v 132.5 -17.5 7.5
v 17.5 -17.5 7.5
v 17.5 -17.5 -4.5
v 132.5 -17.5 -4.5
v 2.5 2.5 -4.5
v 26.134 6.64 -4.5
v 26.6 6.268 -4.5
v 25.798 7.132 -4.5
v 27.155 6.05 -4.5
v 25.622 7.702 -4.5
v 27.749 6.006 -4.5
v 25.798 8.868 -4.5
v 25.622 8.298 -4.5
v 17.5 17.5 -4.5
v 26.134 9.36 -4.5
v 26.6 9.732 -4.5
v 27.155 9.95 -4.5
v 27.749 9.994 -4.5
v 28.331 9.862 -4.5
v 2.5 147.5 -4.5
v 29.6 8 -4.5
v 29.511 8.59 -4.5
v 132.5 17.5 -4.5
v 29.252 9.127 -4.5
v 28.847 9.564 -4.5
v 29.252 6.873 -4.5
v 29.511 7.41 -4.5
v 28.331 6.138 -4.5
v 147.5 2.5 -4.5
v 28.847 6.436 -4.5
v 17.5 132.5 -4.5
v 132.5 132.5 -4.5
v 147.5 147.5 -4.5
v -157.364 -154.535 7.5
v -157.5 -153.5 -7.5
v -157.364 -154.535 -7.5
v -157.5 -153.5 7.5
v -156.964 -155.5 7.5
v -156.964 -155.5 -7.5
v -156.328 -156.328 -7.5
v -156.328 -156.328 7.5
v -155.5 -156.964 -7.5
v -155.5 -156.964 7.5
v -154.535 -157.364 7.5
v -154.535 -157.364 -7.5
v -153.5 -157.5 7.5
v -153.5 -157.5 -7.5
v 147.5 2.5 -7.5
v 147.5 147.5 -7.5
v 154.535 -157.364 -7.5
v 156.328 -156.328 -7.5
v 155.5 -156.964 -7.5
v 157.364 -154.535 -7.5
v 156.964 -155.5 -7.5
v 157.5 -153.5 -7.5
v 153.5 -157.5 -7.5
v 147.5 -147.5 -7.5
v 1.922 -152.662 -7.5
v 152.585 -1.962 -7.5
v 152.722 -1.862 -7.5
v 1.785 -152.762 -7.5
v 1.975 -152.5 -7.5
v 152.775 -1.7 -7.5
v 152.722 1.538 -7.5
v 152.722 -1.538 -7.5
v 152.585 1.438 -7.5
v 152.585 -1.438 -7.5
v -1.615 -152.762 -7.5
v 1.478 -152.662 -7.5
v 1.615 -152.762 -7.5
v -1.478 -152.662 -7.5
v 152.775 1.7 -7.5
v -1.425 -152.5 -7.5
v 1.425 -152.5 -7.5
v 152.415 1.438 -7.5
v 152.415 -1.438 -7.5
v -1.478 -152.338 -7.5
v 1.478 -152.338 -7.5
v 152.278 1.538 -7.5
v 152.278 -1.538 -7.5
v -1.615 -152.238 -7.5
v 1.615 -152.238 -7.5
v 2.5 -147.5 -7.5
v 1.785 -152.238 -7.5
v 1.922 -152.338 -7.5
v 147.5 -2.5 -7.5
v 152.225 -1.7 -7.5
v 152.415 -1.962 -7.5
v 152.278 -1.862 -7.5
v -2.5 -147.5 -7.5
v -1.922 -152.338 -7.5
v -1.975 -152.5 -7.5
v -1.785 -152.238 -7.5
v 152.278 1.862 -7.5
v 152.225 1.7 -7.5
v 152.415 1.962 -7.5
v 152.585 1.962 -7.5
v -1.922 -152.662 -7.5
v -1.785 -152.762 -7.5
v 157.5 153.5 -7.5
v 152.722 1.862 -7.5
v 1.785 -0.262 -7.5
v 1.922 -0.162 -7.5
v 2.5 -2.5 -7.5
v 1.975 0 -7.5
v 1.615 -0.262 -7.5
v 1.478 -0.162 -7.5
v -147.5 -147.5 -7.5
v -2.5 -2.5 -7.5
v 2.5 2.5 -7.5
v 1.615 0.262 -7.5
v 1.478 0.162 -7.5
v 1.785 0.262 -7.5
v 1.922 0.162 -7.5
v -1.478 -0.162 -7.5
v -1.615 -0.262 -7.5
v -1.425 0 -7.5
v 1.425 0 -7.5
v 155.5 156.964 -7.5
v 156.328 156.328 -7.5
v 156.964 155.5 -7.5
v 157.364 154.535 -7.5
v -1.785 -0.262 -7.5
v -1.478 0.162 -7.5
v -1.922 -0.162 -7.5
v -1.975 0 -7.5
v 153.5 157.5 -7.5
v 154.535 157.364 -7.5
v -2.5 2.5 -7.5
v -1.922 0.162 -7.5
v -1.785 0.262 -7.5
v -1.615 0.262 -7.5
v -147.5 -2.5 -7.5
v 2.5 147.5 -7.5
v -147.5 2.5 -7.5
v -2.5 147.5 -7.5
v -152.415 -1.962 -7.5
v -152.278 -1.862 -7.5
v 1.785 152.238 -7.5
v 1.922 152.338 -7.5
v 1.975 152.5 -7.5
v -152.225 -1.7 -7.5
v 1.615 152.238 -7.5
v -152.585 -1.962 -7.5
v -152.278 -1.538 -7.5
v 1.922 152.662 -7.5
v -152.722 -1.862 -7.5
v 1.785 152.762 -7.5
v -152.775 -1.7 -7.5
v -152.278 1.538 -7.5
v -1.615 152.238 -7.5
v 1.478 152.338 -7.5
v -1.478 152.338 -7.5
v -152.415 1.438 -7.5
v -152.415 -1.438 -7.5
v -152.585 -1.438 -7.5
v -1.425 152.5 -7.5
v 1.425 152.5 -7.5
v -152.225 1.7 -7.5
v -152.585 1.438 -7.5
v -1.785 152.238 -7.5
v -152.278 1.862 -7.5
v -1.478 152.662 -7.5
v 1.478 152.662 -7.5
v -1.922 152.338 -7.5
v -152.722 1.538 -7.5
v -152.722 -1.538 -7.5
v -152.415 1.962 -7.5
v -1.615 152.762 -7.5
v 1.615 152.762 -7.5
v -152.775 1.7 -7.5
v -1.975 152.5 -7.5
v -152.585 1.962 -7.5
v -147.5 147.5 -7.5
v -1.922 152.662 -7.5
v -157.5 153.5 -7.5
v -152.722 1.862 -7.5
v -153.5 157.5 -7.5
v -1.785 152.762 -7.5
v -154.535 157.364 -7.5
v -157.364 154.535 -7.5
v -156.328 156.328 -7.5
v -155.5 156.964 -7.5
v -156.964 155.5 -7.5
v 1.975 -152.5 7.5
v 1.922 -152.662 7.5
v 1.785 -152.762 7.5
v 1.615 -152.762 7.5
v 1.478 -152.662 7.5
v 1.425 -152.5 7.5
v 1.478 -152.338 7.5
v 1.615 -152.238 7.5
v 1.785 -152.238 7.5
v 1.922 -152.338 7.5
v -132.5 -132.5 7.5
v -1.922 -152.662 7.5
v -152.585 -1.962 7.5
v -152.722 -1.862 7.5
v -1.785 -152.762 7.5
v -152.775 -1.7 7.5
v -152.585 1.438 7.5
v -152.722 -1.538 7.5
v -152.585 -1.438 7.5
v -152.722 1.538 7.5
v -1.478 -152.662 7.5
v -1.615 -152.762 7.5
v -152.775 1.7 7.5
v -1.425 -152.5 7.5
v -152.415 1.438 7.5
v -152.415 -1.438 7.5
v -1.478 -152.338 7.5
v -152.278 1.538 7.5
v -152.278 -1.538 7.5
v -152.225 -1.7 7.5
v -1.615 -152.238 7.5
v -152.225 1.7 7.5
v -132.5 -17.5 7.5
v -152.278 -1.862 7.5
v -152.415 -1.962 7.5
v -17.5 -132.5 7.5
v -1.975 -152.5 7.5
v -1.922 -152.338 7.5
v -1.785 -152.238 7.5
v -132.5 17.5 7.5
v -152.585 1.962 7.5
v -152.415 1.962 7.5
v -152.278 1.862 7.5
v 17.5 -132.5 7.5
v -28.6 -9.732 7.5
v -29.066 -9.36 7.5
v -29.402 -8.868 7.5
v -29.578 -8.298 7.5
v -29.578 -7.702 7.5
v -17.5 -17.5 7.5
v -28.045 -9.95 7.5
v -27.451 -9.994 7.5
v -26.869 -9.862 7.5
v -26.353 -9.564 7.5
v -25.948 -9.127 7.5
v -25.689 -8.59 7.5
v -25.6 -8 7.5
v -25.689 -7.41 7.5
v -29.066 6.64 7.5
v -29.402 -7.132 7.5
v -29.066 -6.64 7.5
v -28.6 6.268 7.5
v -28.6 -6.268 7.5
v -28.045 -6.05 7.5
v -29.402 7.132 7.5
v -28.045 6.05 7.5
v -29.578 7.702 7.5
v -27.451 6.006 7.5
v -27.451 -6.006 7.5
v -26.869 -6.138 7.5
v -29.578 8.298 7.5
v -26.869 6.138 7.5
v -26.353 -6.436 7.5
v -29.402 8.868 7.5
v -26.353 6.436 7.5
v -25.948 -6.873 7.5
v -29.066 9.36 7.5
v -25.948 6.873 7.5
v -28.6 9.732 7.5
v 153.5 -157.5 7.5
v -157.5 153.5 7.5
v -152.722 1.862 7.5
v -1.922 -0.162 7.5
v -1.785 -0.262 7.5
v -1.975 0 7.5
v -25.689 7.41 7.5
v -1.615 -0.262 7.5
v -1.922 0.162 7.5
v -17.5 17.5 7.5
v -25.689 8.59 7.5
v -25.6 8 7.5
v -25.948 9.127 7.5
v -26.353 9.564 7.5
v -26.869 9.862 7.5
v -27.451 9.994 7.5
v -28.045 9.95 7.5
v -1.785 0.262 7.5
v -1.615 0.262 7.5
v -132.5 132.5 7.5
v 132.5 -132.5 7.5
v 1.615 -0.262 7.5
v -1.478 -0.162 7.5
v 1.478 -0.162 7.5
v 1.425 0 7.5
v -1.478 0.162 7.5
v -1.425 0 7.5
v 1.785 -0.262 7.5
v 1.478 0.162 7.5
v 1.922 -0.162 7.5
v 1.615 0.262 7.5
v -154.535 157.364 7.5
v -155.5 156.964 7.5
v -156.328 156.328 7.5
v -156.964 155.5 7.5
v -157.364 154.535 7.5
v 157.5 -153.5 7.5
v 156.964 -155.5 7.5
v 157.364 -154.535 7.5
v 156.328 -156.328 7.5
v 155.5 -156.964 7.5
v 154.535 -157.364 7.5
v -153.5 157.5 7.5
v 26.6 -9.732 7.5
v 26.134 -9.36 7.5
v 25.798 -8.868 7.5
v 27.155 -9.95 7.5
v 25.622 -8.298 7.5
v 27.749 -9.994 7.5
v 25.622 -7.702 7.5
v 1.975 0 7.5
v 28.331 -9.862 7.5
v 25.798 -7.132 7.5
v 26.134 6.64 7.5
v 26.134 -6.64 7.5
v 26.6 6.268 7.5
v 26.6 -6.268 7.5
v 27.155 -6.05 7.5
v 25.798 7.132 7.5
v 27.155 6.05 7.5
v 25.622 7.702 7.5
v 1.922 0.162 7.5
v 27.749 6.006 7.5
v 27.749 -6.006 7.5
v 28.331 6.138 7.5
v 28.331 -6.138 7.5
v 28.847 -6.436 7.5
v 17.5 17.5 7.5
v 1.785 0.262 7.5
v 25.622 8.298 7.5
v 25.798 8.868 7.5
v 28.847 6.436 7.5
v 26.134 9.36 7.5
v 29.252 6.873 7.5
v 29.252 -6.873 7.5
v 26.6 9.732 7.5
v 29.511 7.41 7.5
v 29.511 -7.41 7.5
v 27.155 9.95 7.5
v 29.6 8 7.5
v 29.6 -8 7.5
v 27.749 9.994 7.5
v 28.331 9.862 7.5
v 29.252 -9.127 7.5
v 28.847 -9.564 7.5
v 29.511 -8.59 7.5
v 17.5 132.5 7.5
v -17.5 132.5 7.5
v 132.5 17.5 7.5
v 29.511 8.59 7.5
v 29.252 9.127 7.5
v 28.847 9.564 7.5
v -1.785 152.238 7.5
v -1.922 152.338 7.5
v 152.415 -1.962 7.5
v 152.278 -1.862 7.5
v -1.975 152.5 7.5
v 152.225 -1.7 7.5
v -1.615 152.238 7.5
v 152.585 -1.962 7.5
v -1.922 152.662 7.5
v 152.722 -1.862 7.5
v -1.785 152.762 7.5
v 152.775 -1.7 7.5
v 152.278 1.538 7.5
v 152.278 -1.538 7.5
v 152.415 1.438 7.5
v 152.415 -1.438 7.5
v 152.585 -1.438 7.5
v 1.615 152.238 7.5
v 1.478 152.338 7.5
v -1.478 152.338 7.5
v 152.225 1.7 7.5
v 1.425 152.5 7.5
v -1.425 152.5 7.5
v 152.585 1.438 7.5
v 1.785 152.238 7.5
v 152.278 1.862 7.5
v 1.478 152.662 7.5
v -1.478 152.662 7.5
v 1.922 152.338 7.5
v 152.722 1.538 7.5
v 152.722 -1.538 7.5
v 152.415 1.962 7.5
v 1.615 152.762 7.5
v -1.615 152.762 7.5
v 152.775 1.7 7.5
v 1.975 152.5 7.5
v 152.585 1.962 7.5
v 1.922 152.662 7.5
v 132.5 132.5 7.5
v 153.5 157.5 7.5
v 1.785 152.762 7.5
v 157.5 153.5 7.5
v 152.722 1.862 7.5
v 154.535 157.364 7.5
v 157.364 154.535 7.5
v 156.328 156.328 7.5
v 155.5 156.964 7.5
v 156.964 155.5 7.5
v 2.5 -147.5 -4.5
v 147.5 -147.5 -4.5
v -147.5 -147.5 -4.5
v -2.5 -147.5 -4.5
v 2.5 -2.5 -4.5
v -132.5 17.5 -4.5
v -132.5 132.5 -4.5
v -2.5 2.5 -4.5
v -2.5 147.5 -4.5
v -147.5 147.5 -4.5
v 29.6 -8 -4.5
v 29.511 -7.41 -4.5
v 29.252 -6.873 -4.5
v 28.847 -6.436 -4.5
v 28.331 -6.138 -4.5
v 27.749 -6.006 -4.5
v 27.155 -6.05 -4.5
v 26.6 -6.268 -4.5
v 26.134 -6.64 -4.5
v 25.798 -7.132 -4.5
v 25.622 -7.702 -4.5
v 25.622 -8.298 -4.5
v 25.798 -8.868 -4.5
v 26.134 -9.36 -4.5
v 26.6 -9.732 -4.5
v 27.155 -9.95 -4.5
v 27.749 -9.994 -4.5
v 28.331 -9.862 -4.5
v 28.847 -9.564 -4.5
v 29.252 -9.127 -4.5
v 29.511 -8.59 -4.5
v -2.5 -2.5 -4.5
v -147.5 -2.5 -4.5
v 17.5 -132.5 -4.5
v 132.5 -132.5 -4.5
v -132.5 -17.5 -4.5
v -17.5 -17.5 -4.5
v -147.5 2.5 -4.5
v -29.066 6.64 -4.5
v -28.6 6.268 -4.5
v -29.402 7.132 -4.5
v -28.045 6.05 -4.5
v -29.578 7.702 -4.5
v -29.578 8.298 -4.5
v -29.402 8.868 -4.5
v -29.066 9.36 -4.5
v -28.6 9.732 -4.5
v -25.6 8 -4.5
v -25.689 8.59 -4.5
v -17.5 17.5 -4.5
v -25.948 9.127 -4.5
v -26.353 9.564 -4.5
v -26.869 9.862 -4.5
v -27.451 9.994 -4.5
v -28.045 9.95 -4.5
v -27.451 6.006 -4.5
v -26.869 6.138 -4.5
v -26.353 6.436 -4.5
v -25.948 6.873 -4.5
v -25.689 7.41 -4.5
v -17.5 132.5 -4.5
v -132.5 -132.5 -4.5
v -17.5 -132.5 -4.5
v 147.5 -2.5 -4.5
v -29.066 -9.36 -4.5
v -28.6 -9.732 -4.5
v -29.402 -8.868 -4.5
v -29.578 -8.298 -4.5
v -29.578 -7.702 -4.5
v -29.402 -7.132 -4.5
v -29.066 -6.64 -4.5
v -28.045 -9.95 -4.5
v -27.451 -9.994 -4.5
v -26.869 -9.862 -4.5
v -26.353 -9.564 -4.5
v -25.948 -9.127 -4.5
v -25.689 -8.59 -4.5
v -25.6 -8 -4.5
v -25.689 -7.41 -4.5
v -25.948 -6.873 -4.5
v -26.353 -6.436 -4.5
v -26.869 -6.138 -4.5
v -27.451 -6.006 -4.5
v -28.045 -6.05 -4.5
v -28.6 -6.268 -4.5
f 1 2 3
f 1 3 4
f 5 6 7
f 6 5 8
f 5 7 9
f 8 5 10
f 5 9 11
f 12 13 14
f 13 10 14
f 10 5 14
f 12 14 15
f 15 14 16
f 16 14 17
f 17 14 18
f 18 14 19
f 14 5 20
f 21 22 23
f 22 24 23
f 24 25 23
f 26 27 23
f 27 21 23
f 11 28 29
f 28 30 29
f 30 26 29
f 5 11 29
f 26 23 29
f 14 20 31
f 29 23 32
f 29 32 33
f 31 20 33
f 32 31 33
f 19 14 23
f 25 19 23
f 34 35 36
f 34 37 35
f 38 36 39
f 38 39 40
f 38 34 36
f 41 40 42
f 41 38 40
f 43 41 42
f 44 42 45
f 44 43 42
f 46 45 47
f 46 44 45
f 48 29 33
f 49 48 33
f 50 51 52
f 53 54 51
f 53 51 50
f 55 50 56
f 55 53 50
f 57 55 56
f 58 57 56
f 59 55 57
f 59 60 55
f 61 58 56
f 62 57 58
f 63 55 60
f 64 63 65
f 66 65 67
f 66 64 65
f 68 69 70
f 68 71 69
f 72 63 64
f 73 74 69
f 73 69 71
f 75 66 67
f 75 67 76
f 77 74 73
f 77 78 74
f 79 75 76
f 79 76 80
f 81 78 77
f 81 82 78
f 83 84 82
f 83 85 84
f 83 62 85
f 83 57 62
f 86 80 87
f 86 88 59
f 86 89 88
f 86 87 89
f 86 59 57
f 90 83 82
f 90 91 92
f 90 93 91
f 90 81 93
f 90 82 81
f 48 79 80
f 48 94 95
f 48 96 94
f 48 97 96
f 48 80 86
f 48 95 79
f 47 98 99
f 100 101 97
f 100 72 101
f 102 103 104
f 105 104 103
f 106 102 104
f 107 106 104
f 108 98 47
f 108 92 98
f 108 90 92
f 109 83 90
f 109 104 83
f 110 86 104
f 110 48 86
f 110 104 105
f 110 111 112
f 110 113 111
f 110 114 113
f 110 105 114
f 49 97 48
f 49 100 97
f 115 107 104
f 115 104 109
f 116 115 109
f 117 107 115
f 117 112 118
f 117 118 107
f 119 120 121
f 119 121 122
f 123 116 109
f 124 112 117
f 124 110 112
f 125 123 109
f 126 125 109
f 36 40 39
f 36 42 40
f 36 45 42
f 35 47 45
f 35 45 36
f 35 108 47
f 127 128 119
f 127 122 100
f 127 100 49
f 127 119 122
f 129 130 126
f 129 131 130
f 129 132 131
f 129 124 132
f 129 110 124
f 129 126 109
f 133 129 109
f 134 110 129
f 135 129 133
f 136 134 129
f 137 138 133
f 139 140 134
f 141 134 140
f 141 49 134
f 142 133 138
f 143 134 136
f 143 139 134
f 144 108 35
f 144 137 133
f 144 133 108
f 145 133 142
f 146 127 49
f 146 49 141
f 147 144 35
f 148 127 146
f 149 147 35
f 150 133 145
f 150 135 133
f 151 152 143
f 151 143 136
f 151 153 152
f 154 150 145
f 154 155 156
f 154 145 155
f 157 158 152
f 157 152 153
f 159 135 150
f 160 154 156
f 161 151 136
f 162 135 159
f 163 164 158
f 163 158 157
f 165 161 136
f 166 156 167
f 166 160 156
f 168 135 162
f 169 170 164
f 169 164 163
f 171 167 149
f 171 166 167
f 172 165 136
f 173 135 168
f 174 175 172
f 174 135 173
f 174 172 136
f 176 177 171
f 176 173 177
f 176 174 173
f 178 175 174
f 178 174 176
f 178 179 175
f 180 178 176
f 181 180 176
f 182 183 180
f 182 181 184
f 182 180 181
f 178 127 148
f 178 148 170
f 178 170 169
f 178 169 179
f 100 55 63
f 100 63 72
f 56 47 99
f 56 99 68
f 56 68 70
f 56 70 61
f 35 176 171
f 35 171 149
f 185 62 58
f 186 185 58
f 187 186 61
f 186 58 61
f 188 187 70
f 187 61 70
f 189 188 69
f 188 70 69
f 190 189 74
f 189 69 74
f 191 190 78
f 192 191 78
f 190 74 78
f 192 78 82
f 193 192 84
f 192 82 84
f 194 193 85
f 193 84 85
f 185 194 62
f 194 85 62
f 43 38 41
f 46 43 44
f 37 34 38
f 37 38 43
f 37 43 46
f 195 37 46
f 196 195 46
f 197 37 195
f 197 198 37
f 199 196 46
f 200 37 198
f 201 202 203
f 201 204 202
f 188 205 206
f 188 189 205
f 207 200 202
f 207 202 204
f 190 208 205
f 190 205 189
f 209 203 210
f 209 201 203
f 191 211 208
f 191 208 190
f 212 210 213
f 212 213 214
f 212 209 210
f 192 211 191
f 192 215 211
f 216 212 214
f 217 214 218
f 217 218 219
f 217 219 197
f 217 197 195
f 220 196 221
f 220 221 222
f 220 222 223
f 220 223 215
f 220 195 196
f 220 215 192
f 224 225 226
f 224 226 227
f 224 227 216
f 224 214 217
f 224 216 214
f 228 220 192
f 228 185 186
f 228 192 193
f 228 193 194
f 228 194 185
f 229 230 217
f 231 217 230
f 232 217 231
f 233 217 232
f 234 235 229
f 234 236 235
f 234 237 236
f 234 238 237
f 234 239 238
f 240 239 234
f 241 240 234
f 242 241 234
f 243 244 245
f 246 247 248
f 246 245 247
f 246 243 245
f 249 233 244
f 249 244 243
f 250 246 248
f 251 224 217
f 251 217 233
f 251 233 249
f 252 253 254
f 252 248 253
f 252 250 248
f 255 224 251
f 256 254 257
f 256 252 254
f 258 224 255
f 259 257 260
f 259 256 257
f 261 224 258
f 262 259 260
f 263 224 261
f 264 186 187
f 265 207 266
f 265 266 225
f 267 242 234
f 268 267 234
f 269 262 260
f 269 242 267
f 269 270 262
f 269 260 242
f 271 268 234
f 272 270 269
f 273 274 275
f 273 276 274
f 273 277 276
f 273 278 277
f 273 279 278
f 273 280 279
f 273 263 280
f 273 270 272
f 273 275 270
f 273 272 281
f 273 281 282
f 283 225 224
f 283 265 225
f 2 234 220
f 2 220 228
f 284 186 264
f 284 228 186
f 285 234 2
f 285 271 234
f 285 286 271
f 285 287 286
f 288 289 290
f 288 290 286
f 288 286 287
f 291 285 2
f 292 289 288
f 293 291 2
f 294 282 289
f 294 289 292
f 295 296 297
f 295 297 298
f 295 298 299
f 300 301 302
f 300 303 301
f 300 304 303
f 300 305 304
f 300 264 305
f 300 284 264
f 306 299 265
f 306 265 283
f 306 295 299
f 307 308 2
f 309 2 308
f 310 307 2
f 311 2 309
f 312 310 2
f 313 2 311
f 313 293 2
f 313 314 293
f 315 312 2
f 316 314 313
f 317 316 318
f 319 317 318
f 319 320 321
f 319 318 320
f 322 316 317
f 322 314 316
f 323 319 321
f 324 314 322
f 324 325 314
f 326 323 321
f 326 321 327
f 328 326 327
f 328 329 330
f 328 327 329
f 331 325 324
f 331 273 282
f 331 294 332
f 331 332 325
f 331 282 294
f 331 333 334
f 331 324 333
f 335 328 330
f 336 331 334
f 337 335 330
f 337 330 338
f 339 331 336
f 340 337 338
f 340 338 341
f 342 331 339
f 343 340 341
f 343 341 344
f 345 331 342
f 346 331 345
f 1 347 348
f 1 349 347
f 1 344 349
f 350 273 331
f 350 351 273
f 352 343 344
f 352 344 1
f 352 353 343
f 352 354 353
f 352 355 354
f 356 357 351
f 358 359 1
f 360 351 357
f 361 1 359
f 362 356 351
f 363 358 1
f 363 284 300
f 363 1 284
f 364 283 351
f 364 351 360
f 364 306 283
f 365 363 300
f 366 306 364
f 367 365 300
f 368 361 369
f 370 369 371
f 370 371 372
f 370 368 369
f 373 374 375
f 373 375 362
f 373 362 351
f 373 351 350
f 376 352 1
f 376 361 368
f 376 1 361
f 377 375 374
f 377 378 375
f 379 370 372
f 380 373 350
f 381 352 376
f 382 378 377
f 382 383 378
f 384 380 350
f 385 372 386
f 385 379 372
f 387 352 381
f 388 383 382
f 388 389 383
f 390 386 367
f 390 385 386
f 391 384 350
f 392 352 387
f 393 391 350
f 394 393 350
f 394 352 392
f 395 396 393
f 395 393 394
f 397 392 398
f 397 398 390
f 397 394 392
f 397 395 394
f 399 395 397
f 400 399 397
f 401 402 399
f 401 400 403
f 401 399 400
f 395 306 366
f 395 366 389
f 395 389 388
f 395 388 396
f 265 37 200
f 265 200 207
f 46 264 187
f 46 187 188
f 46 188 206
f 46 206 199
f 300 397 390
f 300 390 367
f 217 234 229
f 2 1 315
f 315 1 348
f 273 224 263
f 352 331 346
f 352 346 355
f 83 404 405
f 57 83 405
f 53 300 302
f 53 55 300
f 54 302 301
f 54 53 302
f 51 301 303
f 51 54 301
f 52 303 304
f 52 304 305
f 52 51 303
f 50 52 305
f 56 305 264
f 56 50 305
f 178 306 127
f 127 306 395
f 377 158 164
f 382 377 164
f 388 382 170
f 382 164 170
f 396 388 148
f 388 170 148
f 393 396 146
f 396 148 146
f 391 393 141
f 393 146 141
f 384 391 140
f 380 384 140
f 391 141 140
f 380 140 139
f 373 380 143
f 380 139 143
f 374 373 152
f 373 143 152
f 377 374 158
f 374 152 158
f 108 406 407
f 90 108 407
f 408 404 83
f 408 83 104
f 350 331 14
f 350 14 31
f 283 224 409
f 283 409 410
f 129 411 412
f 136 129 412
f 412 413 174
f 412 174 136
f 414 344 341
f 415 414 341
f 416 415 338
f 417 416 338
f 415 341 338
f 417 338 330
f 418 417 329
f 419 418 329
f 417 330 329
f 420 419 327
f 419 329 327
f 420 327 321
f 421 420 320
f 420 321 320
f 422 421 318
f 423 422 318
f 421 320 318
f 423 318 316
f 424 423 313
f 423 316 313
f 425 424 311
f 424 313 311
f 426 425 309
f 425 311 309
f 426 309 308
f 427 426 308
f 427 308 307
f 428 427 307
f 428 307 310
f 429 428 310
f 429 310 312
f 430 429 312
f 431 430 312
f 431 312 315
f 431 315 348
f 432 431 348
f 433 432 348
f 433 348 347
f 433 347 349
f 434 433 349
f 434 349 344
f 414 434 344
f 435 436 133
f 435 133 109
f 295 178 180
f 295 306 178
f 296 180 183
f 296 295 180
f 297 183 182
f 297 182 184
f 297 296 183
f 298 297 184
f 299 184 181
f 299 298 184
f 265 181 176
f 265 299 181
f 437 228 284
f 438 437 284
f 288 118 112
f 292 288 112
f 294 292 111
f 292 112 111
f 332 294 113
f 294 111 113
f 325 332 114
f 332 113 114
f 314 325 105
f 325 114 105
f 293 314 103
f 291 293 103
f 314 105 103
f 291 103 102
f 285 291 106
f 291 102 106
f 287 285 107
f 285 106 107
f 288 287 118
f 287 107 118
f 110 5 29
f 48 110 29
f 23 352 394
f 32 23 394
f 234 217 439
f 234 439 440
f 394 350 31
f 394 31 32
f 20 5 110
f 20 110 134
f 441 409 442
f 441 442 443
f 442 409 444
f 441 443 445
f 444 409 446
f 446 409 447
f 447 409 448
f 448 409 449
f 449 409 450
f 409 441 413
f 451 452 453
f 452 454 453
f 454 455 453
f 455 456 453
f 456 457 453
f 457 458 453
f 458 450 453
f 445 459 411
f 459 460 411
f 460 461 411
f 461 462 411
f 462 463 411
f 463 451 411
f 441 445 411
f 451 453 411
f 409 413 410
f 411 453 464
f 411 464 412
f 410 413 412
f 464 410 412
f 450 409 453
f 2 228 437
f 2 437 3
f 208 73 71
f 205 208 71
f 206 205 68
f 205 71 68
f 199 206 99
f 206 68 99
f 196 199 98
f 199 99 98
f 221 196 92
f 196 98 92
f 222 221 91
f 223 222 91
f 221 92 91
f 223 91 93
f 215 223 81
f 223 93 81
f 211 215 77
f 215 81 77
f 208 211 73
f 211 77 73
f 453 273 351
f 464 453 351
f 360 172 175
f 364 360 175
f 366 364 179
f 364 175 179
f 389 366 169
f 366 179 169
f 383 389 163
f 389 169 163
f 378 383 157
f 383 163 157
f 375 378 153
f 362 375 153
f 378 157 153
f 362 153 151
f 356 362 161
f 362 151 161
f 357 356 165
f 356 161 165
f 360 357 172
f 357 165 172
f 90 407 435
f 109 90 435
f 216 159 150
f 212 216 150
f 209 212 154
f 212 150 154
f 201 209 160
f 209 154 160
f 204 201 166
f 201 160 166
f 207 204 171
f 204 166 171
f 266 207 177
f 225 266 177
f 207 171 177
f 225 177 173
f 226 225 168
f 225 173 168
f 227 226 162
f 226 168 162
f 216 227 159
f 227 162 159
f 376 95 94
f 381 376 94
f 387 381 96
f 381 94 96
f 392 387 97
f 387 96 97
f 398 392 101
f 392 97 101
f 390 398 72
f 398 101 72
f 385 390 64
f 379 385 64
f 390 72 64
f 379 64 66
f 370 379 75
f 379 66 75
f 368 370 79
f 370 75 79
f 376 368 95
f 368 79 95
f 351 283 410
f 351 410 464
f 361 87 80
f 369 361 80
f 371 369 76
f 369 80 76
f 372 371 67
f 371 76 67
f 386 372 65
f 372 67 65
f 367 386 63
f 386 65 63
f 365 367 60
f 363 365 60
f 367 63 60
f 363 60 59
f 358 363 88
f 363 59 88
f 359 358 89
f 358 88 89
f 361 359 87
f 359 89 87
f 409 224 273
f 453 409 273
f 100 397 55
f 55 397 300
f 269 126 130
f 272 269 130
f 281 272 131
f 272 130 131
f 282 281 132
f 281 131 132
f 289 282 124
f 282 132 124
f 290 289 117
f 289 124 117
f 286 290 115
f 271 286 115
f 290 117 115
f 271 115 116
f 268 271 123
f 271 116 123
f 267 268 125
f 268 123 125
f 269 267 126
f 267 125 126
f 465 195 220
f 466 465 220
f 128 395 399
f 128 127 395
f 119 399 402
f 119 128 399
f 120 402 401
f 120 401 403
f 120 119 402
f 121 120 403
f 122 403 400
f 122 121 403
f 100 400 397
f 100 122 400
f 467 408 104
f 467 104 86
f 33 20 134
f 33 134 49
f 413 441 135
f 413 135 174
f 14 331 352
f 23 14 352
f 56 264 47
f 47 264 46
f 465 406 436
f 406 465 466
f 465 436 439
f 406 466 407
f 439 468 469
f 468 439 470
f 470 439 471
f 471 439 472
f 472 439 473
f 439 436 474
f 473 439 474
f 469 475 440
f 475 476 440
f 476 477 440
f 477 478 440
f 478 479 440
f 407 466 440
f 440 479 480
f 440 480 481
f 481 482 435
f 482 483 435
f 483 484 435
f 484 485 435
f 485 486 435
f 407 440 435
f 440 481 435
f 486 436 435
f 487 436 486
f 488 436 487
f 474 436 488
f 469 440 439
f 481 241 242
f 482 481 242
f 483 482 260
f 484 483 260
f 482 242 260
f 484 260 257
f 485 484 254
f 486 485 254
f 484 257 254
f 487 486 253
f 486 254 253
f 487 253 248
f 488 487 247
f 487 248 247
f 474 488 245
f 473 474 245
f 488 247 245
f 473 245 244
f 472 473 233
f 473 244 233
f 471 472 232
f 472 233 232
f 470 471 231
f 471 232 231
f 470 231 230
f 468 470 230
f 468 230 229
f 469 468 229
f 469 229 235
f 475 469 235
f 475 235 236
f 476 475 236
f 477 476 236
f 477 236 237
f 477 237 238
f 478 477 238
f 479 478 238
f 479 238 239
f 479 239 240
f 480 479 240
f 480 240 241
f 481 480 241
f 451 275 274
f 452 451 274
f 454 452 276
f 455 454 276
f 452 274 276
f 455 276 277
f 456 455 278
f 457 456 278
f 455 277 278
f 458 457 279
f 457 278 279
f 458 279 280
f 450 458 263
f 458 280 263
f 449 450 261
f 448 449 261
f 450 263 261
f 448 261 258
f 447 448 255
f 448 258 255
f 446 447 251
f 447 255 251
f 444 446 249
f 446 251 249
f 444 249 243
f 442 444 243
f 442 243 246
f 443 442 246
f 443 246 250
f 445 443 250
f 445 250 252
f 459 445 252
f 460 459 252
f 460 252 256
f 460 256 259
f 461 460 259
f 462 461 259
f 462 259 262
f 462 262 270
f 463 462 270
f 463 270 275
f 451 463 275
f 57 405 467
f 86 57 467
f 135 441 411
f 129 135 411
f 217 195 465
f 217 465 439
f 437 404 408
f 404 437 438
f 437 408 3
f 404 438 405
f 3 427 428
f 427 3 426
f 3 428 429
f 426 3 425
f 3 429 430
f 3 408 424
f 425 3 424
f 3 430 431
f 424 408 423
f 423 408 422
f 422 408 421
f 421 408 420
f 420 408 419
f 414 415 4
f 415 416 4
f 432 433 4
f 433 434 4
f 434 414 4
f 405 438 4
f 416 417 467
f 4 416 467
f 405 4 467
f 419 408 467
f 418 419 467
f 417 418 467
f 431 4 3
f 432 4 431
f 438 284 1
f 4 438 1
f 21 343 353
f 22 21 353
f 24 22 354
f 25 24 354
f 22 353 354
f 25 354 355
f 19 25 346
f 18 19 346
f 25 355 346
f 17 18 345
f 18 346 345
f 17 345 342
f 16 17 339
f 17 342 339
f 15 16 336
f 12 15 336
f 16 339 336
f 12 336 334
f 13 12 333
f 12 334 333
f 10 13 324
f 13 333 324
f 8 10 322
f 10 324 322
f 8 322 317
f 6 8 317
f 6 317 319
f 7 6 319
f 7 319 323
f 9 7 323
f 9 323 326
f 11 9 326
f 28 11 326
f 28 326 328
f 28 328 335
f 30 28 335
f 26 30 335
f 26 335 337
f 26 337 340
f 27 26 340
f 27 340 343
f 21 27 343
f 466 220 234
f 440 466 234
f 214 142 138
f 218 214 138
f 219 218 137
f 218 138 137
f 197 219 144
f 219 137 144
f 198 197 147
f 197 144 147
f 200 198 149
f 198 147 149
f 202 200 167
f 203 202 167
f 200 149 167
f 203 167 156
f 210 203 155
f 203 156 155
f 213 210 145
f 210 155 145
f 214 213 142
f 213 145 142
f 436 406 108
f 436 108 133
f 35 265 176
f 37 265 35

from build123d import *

# Parameters (mm, degrees)
SKETCH1_W           = 145
SKETCH1_H           = 145
BOSS_EXTRUDE2_DEPTH = 7.5
SKETCH3_W           = 145
SKETCH3_H           = 145
SKETCH3_W_2         = 115
SKETCH3_H_2         = 115
BOSS_EXTRUDE4_DEPTH = 12
SKETCH4_R           = 0.275
CUT_EXTRUDE1_DEPTH  = 224.243140992
SKETCH5_R           = 2
CUT_EXTRUDE2_DEPTH  = 224.243140992
FILLET1_R           = 4


with BuildPart() as part:
    # Sketch1 → Boss-Extrude2 (new, symmetric)
    with BuildSketch(Plane.XY):
        Polygon((-157.5, 157.5), (157.5, 157.5), (157.5, -157.5), (-157.5, -157.5), (-157.5, -2.5), (-157.5, 2.5), align=None)
        with Locations((-75, 75)):
            Rectangle(SKETCH1_W, SKETCH1_H, mode=Mode.SUBTRACT)
        with Locations((-75, -75)):
            Rectangle(SKETCH1_W, SKETCH1_H, mode=Mode.SUBTRACT)
        with Locations((75, 75)):
            Rectangle(SKETCH1_W, SKETCH1_H, mode=Mode.SUBTRACT)
        with Locations((75, -75)):
            Rectangle(SKETCH1_W, SKETCH1_H, mode=Mode.SUBTRACT)
    extrude(amount=BOSS_EXTRUDE2_DEPTH, both=True)

    # Sketch3 → Boss-Extrude4 (add)
    # profile 1 of 4: a face of its own
    with BuildSketch(Plane.XY.offset(7.5)):
        with Locations((-75, -75)):
            Rectangle(SKETCH3_W, SKETCH3_H)
        with Locations((-75, -75)):
            Rectangle(SKETCH3_W_2, SKETCH3_H_2, mode=Mode.SUBTRACT)
    # profile 2 of 4: a face of its own
    with BuildSketch(Plane.XY.offset(7.5)):
        with Locations((75, -75)):
            Rectangle(SKETCH3_W, SKETCH3_H)
        with Locations((75, -75)):
            Rectangle(SKETCH3_W_2, SKETCH3_H_2, mode=Mode.SUBTRACT)
    # profile 3 of 4: a face of its own
    with BuildSketch(Plane.XY.offset(7.5)):
        with Locations((75, 75)):
            Rectangle(SKETCH3_W, SKETCH3_H)
        with Locations((75, 75)):
            Rectangle(SKETCH3_W_2, SKETCH3_H_2, mode=Mode.SUBTRACT)
    # profile 4 of 4: a face of its own
    with BuildSketch(Plane.XY.offset(7.5)):
        with Locations((-75, 75)):
            Rectangle(SKETCH3_W, SKETCH3_H)
        with Locations((-75, 75)):
            Rectangle(SKETCH3_W_2, SKETCH3_H_2, mode=Mode.SUBTRACT)
    extrude(amount=-BOSS_EXTRUDE4_DEPTH)

    # Sketch4 → Cut-Extrude1 (cut, through all)
    with BuildSketch(Plane(origin=(0, 0, -7.5), x_dir=(-1, 0, 0), z_dir=(0, 0, -1))):
        with Locations((-1.7, 152.5)):
            Circle(SKETCH4_R)
        with Locations((1.7, 152.5)):
            Circle(SKETCH4_R)
        with Locations((-1.7, 0)):
            Circle(SKETCH4_R)
        with Locations((1.7, 0)):
            Circle(SKETCH4_R)
        with Locations((-152.5, 1.7)):
            Circle(SKETCH4_R)
        with Locations((-152.5, -1.7)):
            Circle(SKETCH4_R)
        with Locations(Location((1.7, -152.5, 0), (0, 0, 180))):
            Circle(SKETCH4_R)
        with Locations(Location((-1.7, -152.5, 0), (0, 0, 180))):
            Circle(SKETCH4_R)
        with Locations(Location((152.5, -1.7, 0), (0, 0, 180))):
            Circle(SKETCH4_R)
        with Locations(Location((152.5, 1.7, 0), (0, 0, 180))):
            Circle(SKETCH4_R)
    extrude(amount=-CUT_EXTRUDE1_DEPTH, mode=Mode.SUBTRACT)

    # Sketch5 → Cut-Extrude2 (cut, through all)
    with BuildSketch(Plane.XY.offset(7.5)):
        with Locations((-27.6, -8)):
            Circle(SKETCH5_R)
        with Locations((-27.6, 8)):
            Circle(SKETCH5_R)
        with Locations((27.6, 8)):
            Circle(SKETCH5_R)
        with Locations((27.6, -8)):
            Circle(SKETCH5_R)
    extrude(amount=-CUT_EXTRUDE2_DEPTH, mode=Mode.SUBTRACT)

    # Fillet1
    fillet1_edges = [part.edges().sort_by_distance(p)[0] for p in [
        (-157.5, 157.5, 0),
        (157.5, 157.5, 0),
        (157.5, -157.5, 0),
        (-157.5, -157.5, 0),
    ]]
    fillet(fillet1_edges, radius=FILLET1_R)


solid = part.part
